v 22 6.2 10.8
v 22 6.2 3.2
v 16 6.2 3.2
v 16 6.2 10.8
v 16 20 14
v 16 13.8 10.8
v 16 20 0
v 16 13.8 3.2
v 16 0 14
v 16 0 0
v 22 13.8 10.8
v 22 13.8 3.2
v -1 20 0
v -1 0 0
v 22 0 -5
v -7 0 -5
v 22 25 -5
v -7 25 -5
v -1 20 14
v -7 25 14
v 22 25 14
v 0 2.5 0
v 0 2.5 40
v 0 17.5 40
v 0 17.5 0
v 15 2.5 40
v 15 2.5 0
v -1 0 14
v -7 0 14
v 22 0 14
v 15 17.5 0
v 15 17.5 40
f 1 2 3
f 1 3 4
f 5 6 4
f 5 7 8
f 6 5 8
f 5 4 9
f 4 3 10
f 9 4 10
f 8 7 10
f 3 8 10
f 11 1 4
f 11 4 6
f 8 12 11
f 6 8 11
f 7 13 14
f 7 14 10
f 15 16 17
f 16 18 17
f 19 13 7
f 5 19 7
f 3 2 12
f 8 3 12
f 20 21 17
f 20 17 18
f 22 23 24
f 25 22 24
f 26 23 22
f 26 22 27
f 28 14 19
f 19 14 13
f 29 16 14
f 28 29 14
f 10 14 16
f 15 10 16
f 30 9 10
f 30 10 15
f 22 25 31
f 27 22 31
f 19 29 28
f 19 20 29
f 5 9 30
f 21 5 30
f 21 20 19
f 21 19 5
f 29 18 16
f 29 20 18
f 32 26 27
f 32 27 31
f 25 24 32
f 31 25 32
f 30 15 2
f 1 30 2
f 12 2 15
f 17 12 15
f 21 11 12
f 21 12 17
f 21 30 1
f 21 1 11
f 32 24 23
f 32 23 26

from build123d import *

# Parameters (mm, degrees)
F0_W     = 15
F0_H     = 15
F1_DEPTH = 40
F3_DEPTH = 14
F5_W     = 7.6
F5_H     = 7.6
F6_DEPTH = 20
F2_W     = 17
F2_H     = 20
F7_DEPTH = 5


with BuildPart() as f1:
    # F0 (on Top) → F1 (new body)
    with BuildSketch(Plane.XY):
        with Locations((7.5, 10)):
            Rectangle(F0_W, F0_H)
    extrude(amount=F1_DEPTH)


with BuildPart() as f3:
    # F2 (on Top) → F3 (new body)
    with BuildSketch(Plane.XY):
        Polygon((-7, 0), (-1, 0), (-1, 20), (16, 20), (16, 0), (22, 0), (22, 25), (-7, 25), align=None)
    extrude(amount=F3_DEPTH)

    # F5 (on offset) → F6 (cut)
    with BuildSketch(Plane.YZ.offset(22)):
        with Locations((10, 7)):
            Rectangle(F5_W, F5_H)
    extrude(amount=-F6_DEPTH, mode=Mode.SUBTRACT)

    # F2 (on Top) → F7 (join)
    with BuildSketch(Plane.XY):
        Polygon((-7, 0), (-1, 0), (-1, 20), (16, 20), (16, 0), (22, 0), (22, 25), (-7, 25), align=None)
        with Locations((7.5, 10)):
            Rectangle(F2_W, F2_H)
    extrude(amount=-F7_DEPTH)


solid = Compound([f1.part, f3.part])
